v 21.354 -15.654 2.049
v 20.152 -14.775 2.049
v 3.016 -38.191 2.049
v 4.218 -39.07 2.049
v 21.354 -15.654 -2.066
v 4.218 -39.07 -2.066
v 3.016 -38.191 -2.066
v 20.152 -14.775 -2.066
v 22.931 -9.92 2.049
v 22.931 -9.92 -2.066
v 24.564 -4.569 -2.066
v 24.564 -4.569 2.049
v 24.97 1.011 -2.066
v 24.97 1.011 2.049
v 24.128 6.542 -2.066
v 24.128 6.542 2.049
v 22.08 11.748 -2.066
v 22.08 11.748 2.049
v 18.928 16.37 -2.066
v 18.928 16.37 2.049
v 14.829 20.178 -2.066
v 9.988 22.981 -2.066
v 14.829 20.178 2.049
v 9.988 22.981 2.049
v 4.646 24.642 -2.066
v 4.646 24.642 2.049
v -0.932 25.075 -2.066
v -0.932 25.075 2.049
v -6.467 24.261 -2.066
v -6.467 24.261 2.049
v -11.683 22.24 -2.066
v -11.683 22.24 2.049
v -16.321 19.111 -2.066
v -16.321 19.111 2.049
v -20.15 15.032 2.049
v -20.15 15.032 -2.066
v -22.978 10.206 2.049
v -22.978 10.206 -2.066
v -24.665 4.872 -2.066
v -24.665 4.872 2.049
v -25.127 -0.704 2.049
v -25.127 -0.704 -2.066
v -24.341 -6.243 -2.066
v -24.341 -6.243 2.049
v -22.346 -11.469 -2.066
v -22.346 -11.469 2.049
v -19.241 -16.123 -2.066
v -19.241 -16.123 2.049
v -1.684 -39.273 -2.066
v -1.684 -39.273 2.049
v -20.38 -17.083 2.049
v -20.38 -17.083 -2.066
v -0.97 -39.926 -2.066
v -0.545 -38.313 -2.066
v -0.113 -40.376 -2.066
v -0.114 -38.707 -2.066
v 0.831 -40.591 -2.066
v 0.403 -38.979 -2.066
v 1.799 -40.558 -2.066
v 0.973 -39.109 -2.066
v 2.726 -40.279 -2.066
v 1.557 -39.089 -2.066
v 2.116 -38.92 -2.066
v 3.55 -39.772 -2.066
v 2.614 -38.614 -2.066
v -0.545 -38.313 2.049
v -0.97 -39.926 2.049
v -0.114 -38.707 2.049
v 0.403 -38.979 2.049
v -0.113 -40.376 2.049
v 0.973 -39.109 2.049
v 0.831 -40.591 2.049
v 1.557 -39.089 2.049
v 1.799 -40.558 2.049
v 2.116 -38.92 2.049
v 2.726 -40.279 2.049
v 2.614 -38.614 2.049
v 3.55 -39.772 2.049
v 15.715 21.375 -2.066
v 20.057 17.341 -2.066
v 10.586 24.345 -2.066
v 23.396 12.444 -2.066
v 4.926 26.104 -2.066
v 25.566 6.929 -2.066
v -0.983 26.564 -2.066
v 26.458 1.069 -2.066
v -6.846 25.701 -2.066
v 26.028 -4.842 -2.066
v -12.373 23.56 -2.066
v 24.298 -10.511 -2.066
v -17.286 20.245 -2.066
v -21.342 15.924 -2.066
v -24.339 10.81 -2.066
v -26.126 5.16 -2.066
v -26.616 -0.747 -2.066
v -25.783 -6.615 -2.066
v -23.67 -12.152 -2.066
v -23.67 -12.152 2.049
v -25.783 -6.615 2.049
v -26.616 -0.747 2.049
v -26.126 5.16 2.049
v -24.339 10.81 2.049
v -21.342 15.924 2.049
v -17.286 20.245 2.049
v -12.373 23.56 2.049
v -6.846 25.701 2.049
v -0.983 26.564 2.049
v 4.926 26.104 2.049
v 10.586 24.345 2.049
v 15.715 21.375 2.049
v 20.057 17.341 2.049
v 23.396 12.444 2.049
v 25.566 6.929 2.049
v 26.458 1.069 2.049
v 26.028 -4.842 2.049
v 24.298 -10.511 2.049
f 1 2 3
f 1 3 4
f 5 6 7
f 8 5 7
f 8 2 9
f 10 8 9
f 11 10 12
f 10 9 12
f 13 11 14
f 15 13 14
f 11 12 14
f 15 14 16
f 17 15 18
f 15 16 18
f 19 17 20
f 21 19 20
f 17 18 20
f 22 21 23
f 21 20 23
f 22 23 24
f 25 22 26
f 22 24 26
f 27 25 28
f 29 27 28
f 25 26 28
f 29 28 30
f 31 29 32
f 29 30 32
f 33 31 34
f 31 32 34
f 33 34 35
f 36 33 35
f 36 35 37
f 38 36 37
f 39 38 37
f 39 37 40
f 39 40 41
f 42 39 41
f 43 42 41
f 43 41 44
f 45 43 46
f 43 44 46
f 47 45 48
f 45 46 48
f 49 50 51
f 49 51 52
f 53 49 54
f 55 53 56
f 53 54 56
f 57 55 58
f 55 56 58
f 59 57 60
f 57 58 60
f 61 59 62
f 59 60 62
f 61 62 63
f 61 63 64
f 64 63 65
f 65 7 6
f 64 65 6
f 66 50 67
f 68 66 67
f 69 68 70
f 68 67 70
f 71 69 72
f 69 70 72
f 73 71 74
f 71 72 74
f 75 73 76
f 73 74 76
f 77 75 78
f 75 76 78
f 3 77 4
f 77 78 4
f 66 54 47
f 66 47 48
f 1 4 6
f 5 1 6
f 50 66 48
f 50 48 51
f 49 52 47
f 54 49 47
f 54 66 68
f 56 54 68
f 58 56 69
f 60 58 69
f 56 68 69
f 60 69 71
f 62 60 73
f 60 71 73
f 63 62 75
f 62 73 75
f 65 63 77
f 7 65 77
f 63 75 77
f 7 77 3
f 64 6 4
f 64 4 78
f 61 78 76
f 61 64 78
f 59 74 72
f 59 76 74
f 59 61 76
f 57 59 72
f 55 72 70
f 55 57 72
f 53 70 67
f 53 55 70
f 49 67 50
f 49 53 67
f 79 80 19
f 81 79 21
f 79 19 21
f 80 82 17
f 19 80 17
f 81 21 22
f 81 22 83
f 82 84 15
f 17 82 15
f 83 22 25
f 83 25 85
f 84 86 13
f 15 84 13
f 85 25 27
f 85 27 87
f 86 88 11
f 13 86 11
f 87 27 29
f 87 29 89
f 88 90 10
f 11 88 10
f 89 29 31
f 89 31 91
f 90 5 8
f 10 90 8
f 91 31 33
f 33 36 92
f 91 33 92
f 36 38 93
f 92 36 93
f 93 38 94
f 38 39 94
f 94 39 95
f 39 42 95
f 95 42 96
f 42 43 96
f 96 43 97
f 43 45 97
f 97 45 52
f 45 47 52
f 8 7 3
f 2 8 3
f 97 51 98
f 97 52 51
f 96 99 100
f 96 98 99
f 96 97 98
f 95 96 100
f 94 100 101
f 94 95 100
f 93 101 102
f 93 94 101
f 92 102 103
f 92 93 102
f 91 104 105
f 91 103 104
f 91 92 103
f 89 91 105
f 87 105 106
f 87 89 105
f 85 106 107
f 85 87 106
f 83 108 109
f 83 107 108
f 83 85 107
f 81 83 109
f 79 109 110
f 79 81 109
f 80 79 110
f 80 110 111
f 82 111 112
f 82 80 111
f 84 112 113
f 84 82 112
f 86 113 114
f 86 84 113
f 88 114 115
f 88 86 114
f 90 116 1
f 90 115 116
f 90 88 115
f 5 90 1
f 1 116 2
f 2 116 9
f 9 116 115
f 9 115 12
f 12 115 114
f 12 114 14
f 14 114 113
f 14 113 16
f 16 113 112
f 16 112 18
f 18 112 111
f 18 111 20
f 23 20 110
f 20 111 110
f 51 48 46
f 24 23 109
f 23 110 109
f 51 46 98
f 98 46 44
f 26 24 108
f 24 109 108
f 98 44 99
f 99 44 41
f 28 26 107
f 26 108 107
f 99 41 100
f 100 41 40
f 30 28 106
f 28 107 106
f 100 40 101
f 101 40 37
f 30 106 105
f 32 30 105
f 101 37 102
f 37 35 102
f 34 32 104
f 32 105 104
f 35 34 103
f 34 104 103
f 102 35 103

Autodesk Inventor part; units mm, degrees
ref_plane "YZ Plane" through (0, 0, 0) normal (1, 0, 0) x (0, 1, 0)
ref_plane "XZ Plane" through (0, 0, 0) normal (0, 1, 0) x (-1, 0, 0)
ref_plane "XY Plane" through (0, 0, 0) normal (0, 0, 1) x (1, 0, 0)
sketch "Sketch1" plane through (0, 0, 0) normal (0, 0, 1) x (1, 0, 0)
  arc A0 (21.0123, -15.4044) -> (-20.0568, -16.8099) centre (-0.0744, 0.0265) ccw
  arc A1 (-1.3604, -38.9999) -> (3.8767, -38.8206) centre (1.1877, -36.8529) ccw
  line L0 (-1.3604, -38.9999) -> (-20.0568, -16.8099)
  line L1 (3.8767, -38.8206) -> (21.0123, -15.4044)
  point P0 (0, 0)
ref_plane "Work Plane1" through (21.0123, -15.4044, 0) normal (0.5906, 0.807, 0) x (-0.807, 0.5906, 0)
sketch "Sketch2" plane through (21.0123, -15.4044, 0) normal (0.5906, 0.807, 0) x (-0.807, 0.5906, 0)
  line L0 (1.0661, 2.0494) -> (-0.4231, 2.0494)
  line L1 (-0.4231, 2.0494) -> (-0.4231, -2.0661)
  line L2 (-0.4231, -2.0661) -> (1.0661, -2.0661)
  line L3 (1.0661, -2.0661) -> (1.0661, 2.0494)
  point P0 (26.054, 0)
sweep "Sweep1" add profiles "Sketch2" path "Sketch1"
properties part number "belt"
